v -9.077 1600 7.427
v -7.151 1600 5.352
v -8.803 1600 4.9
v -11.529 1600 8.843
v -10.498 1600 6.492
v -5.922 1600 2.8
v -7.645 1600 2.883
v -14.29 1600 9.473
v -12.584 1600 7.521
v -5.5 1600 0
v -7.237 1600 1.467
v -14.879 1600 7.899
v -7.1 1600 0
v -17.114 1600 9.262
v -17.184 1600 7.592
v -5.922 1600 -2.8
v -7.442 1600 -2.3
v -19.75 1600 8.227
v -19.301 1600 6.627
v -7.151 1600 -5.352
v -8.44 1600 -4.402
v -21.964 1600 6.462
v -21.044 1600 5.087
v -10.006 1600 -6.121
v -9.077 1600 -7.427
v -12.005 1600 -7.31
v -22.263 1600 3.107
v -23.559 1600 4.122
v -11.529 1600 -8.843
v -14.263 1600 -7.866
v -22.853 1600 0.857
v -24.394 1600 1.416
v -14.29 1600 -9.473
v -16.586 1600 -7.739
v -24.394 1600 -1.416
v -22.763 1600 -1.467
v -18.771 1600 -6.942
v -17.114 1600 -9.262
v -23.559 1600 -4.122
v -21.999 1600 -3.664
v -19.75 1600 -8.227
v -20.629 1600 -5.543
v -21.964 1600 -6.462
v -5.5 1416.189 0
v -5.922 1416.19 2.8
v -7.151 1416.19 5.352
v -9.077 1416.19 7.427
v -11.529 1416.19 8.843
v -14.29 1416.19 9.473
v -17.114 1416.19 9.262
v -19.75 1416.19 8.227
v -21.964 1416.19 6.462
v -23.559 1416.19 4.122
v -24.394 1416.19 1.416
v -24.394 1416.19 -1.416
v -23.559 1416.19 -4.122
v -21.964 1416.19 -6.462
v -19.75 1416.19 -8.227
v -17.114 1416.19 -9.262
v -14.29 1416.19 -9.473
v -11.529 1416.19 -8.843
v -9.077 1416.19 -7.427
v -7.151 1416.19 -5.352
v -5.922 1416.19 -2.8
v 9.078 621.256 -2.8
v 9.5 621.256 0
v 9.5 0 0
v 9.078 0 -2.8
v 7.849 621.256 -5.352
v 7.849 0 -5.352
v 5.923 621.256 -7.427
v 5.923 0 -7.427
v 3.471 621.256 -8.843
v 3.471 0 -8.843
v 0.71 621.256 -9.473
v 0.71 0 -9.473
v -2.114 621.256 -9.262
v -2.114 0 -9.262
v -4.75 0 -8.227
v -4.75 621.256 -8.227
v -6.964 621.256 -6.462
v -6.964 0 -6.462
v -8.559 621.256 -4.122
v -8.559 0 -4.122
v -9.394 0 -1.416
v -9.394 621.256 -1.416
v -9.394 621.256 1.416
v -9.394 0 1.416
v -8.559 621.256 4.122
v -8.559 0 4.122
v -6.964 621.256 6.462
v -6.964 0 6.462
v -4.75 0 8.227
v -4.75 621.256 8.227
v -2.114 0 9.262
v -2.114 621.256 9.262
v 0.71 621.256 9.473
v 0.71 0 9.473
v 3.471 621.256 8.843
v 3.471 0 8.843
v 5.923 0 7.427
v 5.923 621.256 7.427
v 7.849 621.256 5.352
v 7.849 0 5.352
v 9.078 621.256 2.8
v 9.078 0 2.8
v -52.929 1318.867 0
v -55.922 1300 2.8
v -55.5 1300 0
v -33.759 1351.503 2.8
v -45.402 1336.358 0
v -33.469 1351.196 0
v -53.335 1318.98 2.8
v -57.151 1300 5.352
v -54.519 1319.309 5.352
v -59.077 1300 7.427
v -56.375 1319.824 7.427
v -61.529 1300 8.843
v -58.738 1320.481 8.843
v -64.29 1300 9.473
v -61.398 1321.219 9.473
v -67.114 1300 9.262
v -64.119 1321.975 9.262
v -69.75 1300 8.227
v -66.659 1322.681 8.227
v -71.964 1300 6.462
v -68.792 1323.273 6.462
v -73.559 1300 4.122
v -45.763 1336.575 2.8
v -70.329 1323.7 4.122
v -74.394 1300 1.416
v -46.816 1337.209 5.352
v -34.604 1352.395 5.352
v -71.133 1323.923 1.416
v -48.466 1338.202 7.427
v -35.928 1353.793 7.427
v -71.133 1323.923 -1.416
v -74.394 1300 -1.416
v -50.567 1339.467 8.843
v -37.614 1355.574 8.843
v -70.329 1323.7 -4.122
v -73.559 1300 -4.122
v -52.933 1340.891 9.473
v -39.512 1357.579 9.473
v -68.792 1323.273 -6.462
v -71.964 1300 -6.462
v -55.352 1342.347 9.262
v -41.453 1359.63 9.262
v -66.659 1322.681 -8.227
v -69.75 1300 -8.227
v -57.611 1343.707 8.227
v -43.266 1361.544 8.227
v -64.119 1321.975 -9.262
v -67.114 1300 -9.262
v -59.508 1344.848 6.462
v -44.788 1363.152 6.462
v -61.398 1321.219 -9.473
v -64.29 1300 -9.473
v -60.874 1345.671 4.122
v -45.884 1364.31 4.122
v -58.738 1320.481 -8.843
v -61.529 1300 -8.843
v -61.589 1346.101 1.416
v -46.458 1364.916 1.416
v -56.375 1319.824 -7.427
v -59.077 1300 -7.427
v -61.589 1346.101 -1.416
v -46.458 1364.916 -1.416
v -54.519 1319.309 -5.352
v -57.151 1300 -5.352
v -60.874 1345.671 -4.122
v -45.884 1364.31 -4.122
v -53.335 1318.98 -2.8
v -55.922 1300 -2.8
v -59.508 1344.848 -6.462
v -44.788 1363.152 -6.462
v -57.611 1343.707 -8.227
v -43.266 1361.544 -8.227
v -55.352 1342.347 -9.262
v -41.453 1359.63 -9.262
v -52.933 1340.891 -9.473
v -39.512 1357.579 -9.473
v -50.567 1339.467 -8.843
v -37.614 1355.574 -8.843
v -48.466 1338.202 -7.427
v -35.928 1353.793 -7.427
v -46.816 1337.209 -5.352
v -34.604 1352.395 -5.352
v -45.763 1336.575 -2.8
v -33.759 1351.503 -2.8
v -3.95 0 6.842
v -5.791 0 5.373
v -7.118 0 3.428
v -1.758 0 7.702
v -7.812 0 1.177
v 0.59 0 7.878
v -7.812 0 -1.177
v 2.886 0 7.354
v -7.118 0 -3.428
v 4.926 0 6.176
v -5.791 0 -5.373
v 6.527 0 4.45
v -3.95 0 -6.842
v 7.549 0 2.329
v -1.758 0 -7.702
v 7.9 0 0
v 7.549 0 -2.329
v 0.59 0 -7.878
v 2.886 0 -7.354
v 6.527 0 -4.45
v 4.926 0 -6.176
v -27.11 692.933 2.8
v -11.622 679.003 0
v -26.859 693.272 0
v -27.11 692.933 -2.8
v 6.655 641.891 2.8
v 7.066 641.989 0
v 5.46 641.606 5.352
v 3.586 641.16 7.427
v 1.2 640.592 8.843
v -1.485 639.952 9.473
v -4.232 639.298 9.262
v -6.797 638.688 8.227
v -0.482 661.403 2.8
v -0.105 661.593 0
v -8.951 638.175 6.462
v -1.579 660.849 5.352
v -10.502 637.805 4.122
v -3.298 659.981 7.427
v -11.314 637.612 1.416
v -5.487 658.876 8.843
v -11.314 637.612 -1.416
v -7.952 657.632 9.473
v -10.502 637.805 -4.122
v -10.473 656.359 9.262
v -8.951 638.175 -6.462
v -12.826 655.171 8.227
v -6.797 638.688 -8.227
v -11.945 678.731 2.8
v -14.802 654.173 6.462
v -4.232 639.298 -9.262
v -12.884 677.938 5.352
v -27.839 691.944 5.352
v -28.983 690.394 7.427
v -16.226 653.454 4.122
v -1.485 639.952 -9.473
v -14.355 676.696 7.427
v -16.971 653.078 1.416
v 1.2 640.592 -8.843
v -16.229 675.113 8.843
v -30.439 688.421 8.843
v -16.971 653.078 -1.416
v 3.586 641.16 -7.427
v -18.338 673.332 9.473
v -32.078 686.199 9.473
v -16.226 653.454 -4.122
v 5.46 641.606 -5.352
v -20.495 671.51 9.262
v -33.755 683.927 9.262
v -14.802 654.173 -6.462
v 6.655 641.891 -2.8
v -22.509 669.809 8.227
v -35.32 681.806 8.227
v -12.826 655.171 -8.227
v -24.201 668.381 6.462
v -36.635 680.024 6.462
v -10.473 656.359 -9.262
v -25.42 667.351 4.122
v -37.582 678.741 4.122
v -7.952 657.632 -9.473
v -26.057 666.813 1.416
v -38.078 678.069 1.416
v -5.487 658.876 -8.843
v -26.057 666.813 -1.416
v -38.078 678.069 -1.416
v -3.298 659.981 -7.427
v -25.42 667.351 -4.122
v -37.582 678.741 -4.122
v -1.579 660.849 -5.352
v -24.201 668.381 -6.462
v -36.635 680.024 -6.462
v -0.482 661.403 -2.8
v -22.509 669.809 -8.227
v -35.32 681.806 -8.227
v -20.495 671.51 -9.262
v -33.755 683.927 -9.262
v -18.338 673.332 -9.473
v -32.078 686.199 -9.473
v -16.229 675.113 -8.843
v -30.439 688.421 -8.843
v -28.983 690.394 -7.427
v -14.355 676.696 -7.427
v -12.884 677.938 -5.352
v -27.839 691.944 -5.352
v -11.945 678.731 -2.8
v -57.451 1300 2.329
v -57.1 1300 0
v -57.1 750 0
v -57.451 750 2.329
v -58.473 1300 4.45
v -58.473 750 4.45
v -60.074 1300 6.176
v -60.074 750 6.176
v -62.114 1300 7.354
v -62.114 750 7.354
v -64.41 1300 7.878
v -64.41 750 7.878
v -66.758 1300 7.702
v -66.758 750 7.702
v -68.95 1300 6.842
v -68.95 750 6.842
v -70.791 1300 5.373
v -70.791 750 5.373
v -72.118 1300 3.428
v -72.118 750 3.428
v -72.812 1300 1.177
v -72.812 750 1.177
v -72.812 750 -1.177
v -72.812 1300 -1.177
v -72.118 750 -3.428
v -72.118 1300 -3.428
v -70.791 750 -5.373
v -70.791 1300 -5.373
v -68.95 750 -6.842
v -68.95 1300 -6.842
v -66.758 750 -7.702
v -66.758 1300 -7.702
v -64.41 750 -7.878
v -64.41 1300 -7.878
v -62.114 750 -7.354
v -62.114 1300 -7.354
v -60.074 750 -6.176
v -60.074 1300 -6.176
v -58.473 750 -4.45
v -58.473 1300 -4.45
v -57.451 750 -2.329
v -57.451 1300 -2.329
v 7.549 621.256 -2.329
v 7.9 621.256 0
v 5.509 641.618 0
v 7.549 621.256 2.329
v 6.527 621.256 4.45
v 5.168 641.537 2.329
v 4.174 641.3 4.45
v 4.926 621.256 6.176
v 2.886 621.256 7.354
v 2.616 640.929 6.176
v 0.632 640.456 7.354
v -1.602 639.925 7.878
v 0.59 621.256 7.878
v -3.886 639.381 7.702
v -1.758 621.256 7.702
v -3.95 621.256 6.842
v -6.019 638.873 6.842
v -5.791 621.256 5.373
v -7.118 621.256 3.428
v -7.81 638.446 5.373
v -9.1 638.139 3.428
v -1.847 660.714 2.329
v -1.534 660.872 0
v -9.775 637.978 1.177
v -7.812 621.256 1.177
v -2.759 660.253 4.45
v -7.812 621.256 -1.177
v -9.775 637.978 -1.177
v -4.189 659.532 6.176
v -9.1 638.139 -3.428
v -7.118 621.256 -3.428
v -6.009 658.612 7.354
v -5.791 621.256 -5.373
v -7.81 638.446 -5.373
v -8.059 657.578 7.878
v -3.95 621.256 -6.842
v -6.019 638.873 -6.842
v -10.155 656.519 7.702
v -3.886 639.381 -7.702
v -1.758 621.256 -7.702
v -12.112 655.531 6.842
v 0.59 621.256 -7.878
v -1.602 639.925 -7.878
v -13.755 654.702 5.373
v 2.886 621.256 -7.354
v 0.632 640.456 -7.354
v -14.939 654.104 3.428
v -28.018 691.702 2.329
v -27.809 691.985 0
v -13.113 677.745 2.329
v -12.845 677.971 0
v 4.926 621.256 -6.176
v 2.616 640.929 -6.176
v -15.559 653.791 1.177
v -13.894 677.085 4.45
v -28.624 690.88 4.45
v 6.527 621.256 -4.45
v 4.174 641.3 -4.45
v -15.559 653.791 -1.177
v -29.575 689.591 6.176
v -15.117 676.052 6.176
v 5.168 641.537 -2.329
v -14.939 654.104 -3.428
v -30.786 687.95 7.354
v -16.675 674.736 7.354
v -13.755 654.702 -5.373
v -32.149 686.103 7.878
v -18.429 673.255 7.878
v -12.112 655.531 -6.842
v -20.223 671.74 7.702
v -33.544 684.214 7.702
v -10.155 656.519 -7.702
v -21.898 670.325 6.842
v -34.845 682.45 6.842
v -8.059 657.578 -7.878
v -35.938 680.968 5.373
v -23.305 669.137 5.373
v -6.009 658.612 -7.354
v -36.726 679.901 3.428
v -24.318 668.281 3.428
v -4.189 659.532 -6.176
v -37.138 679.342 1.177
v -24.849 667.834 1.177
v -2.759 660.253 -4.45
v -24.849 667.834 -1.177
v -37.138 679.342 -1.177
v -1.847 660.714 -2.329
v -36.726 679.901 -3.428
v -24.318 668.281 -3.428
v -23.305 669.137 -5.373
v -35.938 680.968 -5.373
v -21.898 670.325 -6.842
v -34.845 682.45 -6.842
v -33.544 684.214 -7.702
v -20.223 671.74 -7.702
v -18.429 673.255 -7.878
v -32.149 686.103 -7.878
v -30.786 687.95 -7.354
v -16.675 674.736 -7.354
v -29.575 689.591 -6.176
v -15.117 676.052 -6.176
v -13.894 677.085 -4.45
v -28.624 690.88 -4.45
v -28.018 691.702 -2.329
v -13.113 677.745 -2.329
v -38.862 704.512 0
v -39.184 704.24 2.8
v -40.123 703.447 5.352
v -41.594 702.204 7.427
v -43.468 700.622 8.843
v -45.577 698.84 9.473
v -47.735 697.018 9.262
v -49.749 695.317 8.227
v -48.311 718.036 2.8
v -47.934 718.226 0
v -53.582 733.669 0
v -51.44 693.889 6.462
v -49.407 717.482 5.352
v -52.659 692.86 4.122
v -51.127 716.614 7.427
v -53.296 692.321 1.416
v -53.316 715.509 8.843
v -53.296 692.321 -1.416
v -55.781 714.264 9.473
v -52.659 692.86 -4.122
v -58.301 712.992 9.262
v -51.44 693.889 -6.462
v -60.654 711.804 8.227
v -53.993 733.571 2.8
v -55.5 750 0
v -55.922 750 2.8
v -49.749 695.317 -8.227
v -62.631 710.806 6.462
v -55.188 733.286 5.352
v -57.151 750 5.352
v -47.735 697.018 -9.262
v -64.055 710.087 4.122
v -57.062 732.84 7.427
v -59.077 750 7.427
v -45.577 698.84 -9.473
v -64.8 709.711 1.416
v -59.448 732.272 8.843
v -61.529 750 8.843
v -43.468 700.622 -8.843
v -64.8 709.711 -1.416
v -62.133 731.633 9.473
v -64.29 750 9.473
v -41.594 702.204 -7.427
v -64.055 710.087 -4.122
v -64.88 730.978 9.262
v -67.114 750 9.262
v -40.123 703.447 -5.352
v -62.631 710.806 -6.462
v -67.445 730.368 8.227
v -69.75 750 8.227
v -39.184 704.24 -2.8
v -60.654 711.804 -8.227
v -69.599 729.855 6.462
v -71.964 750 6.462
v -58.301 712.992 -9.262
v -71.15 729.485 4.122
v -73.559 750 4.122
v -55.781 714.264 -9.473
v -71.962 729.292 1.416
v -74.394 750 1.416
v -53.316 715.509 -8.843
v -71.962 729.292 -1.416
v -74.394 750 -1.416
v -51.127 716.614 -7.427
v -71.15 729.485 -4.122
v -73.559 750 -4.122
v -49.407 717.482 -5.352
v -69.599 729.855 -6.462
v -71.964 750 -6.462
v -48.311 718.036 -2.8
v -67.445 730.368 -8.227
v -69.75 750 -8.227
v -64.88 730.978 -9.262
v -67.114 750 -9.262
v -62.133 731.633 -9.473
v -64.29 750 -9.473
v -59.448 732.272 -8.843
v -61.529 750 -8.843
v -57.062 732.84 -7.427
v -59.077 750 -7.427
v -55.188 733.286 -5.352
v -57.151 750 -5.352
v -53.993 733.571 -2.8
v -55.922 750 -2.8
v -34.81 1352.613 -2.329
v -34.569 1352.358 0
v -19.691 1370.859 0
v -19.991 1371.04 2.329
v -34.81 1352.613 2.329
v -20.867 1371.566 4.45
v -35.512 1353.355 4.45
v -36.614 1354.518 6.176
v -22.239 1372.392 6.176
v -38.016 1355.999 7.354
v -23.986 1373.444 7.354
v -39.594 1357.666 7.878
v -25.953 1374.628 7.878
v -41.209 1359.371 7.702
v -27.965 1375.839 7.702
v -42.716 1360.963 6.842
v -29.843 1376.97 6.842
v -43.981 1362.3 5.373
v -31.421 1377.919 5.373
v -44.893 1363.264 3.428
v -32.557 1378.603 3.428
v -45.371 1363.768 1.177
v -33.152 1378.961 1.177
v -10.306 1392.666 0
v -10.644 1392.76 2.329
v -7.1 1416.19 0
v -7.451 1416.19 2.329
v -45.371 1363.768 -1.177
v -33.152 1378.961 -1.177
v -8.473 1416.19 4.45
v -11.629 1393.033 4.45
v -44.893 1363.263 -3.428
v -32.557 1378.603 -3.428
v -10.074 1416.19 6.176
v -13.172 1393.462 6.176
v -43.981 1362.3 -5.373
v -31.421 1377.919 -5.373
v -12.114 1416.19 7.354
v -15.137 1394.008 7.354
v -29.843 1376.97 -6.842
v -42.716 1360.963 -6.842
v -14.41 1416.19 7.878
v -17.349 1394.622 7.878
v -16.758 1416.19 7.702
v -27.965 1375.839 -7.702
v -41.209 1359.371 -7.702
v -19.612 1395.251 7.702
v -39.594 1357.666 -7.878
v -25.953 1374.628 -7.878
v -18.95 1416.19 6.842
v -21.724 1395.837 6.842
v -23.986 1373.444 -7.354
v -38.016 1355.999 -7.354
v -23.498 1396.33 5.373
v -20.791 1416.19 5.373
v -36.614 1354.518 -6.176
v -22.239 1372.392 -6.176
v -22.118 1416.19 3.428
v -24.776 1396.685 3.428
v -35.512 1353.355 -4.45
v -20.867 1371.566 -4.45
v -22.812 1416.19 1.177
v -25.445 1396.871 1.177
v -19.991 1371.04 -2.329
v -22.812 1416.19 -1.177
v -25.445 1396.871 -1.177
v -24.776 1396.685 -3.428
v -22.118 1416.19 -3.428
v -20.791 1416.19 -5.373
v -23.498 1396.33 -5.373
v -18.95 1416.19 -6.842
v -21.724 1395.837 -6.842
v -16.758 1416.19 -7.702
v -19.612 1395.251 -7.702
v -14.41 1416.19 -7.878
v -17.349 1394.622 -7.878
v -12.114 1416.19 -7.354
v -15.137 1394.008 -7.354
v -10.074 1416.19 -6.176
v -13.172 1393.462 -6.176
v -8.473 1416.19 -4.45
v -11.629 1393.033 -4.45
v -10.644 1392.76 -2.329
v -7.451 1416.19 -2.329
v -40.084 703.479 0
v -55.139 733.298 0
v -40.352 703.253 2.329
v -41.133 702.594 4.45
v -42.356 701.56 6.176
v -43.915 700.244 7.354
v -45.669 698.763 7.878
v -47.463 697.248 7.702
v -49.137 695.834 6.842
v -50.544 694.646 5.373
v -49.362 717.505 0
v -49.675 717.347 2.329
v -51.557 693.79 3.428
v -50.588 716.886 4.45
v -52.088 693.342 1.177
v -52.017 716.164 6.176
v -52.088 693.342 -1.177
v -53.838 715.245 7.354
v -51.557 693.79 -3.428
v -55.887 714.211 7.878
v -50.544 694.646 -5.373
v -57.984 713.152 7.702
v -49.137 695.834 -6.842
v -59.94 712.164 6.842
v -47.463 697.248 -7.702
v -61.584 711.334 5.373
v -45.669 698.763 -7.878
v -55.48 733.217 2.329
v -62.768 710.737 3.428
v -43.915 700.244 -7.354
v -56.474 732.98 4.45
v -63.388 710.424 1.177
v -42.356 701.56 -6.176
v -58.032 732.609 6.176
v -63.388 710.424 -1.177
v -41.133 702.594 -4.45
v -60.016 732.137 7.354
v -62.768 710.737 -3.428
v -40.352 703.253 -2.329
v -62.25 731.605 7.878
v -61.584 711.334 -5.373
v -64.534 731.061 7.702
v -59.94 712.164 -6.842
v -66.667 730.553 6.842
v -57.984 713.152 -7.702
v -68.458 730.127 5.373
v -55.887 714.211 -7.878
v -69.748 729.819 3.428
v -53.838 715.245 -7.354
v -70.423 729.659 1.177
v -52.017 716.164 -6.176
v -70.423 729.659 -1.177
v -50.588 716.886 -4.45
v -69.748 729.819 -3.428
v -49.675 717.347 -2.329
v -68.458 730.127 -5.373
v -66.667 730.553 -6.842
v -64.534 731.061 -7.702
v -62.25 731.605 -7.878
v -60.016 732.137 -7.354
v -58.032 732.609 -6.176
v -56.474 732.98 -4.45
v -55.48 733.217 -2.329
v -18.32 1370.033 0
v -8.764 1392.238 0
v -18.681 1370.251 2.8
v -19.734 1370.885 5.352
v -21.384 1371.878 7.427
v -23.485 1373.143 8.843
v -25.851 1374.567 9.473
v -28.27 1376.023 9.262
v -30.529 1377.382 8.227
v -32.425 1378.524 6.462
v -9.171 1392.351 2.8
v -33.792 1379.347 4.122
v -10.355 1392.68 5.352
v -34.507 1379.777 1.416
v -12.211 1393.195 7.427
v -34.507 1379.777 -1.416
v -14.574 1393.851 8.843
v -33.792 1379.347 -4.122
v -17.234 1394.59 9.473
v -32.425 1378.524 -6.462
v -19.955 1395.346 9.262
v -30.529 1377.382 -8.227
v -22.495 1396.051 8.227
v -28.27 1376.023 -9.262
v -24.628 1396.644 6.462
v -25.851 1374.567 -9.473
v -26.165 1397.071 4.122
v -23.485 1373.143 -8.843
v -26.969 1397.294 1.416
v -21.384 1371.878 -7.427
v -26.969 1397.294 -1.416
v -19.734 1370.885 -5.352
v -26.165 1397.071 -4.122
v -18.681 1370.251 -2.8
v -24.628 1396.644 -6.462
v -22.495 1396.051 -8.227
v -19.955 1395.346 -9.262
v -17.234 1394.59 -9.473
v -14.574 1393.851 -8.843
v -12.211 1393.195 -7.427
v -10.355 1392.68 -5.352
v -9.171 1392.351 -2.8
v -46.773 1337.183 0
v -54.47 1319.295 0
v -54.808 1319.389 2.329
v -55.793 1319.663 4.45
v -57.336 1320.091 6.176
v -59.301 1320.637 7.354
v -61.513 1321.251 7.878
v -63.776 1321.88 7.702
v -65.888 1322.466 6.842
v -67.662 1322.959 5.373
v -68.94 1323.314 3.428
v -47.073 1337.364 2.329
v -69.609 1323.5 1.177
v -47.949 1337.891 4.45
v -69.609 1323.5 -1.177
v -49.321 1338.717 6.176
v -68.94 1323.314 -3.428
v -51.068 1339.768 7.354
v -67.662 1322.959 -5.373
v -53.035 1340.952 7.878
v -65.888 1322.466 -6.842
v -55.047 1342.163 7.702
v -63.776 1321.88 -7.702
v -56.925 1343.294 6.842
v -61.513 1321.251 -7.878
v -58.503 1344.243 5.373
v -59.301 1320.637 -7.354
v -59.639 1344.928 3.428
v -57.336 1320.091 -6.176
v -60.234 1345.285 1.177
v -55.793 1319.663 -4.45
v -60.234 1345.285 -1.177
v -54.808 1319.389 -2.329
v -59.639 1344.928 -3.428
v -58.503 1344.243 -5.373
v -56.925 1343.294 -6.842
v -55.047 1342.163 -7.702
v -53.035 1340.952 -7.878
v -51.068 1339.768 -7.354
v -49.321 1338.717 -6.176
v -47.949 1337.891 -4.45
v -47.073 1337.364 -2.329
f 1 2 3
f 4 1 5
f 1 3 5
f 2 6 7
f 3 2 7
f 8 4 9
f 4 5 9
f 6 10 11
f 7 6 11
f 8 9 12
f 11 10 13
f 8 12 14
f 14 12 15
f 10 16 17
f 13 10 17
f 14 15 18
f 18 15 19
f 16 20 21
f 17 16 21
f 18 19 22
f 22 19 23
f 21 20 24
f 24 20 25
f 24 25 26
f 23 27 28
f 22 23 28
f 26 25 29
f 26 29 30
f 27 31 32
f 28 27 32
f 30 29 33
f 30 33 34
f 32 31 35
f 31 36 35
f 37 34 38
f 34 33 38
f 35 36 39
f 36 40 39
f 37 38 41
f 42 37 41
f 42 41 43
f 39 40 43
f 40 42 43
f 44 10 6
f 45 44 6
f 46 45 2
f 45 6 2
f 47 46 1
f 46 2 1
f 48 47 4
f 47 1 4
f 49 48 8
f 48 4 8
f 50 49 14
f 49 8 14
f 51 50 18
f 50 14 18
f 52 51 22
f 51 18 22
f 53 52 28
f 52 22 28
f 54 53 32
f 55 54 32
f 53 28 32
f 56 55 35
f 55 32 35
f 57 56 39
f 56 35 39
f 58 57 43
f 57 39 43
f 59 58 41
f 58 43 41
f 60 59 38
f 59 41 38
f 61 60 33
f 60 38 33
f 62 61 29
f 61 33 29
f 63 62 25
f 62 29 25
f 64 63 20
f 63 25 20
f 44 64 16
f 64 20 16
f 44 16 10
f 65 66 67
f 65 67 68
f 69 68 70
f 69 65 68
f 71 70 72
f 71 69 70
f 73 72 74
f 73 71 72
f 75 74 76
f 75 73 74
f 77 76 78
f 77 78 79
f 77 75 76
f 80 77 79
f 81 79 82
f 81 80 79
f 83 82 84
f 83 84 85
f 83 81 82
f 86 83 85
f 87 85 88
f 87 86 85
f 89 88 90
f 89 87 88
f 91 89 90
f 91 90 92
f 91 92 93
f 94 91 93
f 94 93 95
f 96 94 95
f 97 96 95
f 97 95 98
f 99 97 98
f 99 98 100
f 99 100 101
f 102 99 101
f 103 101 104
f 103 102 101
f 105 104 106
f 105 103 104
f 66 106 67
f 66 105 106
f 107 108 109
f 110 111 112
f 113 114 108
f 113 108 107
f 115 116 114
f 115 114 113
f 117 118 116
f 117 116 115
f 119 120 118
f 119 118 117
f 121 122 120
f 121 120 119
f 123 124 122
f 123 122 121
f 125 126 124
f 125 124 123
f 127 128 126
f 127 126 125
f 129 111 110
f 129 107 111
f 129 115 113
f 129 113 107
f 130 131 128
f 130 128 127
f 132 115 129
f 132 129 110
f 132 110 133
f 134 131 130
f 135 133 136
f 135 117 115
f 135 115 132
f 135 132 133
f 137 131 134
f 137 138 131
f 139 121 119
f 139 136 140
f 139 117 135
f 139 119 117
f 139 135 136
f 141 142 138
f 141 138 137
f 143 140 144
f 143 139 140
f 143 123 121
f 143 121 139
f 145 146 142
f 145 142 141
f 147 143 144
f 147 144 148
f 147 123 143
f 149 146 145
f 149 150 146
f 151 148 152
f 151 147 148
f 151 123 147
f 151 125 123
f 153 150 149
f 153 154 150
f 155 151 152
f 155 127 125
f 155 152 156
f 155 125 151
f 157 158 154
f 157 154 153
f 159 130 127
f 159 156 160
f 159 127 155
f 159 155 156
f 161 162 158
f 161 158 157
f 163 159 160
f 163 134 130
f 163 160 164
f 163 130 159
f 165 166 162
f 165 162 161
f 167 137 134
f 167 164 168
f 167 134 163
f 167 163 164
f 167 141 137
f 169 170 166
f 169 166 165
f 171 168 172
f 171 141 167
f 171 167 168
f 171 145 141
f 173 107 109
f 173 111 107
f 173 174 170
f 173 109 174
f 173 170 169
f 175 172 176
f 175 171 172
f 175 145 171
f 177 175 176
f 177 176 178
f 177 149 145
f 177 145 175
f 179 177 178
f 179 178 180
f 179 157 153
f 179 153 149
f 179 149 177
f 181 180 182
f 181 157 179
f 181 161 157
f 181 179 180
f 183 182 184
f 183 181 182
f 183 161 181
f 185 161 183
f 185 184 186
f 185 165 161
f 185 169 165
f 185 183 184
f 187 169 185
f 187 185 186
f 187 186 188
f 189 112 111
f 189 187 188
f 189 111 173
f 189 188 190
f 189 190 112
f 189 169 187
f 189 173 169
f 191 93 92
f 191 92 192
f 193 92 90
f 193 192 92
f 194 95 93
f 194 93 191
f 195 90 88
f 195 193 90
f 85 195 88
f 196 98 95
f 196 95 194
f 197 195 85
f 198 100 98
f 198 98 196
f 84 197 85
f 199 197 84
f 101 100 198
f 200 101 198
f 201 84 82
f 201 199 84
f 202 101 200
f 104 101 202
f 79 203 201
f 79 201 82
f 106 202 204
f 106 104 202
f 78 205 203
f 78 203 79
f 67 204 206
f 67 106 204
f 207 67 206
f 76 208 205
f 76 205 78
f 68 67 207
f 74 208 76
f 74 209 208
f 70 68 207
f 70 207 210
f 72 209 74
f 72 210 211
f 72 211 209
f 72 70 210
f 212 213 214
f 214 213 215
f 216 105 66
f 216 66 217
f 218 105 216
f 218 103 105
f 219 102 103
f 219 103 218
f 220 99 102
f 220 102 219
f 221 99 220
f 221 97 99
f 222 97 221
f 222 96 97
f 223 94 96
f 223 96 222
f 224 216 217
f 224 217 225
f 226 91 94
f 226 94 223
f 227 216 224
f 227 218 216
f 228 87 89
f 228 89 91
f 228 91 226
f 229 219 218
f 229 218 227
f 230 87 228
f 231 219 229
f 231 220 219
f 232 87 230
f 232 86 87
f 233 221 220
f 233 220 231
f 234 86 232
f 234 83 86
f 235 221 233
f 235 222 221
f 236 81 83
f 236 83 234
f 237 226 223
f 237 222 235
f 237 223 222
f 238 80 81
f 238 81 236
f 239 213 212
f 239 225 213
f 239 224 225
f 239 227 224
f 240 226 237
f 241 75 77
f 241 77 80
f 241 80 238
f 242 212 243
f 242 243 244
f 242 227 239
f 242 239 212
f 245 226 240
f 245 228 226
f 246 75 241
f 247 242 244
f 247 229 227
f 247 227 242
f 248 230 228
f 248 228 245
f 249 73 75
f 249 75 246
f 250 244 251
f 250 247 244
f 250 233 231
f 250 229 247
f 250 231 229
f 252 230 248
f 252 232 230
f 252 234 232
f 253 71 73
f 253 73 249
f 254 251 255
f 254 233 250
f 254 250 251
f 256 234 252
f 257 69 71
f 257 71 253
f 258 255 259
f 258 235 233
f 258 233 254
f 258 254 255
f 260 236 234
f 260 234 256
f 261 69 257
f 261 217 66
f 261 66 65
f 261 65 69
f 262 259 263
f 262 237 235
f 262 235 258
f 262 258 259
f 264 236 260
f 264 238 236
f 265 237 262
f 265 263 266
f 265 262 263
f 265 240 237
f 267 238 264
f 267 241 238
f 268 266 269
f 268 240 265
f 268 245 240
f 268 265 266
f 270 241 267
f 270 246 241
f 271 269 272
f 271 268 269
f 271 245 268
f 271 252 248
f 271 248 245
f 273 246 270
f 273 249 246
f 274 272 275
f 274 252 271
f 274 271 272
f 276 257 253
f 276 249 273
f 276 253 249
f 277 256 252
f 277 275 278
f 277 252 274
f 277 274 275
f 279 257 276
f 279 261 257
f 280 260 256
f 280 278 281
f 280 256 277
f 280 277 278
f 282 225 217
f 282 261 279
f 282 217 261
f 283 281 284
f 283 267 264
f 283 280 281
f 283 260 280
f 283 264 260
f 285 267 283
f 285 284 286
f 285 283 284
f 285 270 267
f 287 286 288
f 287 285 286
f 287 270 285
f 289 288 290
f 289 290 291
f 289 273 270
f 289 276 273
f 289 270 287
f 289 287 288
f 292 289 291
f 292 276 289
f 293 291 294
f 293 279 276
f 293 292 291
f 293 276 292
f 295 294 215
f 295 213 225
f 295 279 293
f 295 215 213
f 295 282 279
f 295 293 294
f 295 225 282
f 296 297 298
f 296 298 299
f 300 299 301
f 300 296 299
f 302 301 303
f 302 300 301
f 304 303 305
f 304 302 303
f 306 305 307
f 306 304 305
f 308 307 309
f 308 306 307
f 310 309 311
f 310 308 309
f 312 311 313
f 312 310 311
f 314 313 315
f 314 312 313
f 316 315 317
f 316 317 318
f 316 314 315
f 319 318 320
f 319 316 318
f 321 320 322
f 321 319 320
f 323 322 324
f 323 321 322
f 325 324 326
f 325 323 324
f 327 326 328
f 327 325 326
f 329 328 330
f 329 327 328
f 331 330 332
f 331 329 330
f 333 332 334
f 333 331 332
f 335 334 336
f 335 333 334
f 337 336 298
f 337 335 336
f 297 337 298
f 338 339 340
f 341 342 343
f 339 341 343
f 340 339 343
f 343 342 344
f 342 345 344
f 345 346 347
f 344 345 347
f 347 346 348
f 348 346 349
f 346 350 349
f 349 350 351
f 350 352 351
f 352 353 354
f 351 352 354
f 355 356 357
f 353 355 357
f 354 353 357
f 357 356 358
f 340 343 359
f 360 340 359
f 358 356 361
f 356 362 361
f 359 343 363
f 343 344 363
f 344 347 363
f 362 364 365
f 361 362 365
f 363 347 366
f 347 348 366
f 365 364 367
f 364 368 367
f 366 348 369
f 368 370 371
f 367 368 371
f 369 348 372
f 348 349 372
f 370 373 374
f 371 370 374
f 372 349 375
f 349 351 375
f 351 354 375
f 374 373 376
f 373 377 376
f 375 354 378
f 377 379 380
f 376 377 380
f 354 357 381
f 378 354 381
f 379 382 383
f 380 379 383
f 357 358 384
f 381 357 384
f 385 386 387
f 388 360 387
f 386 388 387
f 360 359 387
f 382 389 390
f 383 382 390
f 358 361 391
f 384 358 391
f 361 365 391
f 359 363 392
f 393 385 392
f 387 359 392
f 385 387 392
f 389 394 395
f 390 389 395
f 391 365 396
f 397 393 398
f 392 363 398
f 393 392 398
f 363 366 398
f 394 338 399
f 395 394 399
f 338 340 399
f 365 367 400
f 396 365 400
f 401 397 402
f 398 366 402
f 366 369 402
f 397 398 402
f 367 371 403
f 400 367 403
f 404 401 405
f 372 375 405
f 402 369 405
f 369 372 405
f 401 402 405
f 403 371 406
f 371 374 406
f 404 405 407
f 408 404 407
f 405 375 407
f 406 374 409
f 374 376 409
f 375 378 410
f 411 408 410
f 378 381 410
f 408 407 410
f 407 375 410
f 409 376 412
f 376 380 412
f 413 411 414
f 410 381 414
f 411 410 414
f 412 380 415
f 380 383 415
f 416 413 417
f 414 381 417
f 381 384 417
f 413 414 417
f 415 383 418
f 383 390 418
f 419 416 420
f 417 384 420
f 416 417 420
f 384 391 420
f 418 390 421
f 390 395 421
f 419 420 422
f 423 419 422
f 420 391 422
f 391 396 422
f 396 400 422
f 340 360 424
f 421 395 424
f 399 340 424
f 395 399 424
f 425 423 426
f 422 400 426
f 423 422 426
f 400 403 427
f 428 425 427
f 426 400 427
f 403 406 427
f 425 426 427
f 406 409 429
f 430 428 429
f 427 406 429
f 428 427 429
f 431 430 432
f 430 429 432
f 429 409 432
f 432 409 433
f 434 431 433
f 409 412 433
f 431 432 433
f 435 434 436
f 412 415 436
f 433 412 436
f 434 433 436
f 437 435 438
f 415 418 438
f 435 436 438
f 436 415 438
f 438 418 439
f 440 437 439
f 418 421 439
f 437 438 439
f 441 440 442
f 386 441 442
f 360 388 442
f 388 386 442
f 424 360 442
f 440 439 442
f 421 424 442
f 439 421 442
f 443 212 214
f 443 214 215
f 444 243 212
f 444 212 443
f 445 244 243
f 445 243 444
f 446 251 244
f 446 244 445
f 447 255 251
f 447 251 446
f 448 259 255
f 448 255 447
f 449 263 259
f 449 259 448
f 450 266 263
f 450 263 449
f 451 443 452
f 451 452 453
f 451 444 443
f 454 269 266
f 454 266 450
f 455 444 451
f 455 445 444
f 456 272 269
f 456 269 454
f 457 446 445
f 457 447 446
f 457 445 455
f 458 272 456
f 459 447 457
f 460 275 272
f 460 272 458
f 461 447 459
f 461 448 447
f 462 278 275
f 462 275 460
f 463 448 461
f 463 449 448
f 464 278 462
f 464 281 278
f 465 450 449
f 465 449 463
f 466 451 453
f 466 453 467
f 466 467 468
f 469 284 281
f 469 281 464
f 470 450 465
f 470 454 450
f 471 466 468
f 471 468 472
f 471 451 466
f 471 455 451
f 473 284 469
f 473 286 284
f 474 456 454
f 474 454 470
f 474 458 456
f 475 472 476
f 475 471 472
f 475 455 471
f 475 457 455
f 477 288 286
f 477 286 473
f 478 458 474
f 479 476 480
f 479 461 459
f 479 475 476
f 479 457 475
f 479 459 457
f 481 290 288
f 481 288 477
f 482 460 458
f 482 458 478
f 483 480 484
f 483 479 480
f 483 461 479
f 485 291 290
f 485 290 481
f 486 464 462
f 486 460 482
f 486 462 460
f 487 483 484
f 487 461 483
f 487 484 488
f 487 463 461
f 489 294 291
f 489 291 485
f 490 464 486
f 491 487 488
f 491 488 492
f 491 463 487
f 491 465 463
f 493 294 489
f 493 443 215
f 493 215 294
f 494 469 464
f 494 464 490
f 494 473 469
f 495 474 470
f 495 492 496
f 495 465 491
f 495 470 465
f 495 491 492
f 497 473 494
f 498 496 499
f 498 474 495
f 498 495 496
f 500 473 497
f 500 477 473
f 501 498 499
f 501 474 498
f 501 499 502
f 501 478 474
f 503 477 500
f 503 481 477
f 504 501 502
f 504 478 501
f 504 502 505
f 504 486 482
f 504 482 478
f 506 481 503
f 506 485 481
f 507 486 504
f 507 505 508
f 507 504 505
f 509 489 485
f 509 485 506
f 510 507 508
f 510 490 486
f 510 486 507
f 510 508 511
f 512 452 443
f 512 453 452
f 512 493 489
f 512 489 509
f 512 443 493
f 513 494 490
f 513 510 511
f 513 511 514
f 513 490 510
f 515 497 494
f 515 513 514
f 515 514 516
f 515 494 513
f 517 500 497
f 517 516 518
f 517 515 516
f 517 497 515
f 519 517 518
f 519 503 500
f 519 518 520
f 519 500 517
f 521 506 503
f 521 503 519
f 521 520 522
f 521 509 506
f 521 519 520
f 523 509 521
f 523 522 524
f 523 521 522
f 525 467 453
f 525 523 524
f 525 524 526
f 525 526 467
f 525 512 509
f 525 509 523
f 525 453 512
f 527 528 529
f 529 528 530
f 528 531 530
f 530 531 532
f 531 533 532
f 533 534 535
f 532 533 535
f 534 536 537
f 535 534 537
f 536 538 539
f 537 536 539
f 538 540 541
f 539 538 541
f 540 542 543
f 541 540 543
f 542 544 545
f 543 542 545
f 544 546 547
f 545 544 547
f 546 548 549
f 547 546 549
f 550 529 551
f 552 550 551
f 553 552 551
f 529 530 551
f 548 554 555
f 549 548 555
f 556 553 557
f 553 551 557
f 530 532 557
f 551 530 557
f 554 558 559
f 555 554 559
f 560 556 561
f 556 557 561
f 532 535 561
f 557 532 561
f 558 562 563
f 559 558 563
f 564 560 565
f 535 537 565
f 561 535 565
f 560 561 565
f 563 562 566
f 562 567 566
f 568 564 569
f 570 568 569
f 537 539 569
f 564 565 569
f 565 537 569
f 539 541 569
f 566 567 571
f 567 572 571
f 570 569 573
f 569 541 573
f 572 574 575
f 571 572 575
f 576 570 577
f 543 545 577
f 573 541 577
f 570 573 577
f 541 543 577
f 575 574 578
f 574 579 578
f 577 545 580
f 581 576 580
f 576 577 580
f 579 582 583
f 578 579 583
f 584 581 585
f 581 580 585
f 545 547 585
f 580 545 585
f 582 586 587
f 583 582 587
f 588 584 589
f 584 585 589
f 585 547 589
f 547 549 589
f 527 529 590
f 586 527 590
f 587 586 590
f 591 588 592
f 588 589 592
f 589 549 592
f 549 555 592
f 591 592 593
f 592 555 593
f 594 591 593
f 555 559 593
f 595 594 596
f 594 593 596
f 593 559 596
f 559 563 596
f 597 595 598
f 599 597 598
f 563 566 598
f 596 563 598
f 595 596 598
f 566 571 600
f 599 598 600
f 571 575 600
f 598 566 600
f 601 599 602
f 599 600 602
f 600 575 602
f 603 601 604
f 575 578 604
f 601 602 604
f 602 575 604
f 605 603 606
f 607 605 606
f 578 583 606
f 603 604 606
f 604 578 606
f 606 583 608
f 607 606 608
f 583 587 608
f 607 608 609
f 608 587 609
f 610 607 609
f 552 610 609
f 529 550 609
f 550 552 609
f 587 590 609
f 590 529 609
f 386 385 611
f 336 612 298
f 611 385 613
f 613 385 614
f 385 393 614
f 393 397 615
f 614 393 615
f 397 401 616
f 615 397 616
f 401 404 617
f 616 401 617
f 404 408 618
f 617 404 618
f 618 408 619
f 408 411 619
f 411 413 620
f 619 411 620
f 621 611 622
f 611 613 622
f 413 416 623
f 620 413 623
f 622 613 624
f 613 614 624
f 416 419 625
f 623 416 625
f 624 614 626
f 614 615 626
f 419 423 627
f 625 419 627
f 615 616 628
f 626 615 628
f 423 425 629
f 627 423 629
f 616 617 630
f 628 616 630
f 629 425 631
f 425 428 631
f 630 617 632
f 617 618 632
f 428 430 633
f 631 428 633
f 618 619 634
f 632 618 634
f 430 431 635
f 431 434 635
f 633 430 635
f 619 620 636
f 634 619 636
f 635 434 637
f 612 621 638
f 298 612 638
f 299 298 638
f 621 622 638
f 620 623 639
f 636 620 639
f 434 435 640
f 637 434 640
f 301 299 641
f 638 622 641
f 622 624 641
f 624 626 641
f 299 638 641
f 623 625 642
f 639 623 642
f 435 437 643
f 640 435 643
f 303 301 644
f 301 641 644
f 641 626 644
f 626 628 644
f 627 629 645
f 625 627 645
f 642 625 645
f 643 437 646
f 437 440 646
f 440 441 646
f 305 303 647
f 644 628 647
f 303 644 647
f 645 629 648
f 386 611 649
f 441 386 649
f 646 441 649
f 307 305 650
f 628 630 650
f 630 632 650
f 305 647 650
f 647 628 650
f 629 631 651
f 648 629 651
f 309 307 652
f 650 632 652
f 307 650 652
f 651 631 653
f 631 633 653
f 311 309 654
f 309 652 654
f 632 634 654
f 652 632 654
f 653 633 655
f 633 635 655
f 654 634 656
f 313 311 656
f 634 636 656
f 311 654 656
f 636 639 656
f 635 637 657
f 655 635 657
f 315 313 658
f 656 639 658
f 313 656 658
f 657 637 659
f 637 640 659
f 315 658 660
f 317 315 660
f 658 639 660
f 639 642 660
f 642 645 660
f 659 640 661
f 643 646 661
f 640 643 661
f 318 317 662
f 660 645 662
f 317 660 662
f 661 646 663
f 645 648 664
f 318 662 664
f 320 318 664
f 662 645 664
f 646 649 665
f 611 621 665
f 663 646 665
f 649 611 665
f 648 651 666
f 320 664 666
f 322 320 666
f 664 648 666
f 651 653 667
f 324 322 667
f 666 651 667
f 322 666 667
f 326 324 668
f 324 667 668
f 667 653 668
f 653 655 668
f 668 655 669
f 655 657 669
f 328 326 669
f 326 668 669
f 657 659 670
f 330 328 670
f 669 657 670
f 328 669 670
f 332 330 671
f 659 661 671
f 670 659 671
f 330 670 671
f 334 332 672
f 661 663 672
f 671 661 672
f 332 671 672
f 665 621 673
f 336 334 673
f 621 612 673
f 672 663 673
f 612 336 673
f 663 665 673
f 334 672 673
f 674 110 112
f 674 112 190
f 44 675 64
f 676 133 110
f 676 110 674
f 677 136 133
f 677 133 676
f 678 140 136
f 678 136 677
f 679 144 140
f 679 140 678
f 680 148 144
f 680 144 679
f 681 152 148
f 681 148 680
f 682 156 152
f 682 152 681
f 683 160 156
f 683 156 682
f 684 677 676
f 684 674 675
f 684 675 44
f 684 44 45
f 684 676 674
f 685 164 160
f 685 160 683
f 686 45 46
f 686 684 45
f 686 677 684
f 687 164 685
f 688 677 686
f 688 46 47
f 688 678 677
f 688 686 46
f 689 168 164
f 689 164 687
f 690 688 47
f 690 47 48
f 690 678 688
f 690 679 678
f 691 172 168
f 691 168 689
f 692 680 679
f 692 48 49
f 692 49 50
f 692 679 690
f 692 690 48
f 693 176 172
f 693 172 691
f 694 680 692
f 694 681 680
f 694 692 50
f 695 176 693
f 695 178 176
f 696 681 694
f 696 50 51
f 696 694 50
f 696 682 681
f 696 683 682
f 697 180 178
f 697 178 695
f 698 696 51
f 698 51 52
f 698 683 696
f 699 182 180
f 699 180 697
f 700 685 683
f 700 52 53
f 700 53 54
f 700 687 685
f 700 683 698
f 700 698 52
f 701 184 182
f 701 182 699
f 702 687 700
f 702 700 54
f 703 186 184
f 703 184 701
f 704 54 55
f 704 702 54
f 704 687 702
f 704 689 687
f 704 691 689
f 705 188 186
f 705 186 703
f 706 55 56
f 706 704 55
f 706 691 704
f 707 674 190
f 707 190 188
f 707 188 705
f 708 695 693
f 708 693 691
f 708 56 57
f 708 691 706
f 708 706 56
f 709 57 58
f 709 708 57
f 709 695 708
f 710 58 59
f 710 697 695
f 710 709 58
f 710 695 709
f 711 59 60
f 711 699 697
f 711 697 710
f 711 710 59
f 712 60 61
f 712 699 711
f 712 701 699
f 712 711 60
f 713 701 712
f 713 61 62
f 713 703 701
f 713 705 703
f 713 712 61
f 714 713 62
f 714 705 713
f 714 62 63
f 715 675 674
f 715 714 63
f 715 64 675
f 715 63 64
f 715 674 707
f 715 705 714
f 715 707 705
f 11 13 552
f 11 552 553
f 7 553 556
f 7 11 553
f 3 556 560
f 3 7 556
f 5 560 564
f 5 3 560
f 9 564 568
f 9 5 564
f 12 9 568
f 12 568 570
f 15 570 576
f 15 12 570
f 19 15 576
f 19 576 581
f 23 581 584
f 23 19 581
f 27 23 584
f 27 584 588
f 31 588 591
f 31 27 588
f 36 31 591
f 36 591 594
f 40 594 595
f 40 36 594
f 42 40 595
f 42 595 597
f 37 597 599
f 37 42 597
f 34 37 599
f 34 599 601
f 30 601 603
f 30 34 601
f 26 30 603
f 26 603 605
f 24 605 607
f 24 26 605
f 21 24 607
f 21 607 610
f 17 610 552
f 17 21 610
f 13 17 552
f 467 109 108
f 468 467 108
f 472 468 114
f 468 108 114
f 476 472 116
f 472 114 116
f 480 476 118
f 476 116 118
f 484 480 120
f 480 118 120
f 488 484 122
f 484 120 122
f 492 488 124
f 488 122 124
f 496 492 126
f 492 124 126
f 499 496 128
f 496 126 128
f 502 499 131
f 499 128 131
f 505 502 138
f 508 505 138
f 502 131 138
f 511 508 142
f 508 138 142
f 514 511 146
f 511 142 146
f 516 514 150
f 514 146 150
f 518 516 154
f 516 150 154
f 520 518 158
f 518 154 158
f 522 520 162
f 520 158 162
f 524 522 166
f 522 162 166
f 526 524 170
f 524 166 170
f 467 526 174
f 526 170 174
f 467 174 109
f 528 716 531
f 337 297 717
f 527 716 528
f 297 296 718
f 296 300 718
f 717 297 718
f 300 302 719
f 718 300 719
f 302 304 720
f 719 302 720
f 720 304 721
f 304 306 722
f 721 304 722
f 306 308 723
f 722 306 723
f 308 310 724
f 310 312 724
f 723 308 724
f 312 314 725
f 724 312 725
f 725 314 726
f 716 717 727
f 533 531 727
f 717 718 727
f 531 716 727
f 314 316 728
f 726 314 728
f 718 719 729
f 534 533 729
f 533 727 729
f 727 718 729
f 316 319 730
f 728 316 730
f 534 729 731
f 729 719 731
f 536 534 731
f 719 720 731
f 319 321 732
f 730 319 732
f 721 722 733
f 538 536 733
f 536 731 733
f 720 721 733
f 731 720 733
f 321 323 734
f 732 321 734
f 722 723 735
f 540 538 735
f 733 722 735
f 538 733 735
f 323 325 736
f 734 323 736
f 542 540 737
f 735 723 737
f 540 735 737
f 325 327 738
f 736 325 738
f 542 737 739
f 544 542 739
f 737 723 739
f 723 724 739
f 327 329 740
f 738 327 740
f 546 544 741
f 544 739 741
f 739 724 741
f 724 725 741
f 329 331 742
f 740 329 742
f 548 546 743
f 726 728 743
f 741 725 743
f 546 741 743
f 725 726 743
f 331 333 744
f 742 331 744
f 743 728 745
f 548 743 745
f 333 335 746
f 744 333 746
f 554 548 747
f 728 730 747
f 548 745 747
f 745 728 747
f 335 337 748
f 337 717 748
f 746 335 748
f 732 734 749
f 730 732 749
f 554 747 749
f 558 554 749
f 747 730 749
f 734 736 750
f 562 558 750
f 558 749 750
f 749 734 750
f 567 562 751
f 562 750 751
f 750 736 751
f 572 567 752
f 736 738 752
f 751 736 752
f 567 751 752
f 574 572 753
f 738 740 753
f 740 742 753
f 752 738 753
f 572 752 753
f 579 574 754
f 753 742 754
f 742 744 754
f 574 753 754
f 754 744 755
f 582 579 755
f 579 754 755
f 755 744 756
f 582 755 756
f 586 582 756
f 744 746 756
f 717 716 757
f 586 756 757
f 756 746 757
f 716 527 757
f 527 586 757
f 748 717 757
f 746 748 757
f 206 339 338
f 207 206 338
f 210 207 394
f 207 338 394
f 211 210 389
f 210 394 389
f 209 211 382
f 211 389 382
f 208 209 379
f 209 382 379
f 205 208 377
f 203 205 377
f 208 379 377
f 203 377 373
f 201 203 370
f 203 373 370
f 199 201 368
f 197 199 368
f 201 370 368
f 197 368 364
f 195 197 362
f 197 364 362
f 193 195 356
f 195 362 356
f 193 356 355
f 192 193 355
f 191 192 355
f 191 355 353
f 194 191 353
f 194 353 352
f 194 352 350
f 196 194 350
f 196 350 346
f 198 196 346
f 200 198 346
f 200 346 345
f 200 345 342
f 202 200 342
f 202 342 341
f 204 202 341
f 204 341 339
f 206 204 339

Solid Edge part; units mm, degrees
sketch "Sketch1" plane through (0, 0, 0) normal (0, 0, 1) x (1, 0, 0)
  line L0 (0, 0) -> (0, 621.2561)
  arc A0 (0, 621.2561) -> (-32.5, 685.628) centre (-80, 621.2561) ccw
  arc A1 (-32.5, 685.628) -> (-65, 750) centre (15, 750) cw
  line L1 (-65, 750) -> (-65, 1300)
  arc A2 (-65, 1300) -> (-40, 1358.0948) centre (15, 1300) cw
  arc A3 (-40, 1358.0948) -> (-15, 1416.1895) centre (-95, 1416.1895) ccw
  line L2 (-15, 1416.1895) -> (-15, 1600)
  dimension "D1" = 80
  dimension "D2" = 750
  dimension "D3" = 1300
  dimension "D4" = 1600
  dimension "D5" = 65
  dimension "D6" = 50
sketch "Sketch2" plane through (0, 0, 0) normal (0, -1, 0) x (1, 0, 0)
  circle A0 centre (0, 0) radius 9.5
  dimension "D1" = 19
sweep "SweptProtrusion_5" add profiles "Sketch2" path "Sketch1"
shell "Thinwall_4" thickness 1.6 removed faces 2 at (-6.1433, 0, 6.5233) at (-8.4767, 1600, 6.1433)
properties material "Aluminum, 1060"
